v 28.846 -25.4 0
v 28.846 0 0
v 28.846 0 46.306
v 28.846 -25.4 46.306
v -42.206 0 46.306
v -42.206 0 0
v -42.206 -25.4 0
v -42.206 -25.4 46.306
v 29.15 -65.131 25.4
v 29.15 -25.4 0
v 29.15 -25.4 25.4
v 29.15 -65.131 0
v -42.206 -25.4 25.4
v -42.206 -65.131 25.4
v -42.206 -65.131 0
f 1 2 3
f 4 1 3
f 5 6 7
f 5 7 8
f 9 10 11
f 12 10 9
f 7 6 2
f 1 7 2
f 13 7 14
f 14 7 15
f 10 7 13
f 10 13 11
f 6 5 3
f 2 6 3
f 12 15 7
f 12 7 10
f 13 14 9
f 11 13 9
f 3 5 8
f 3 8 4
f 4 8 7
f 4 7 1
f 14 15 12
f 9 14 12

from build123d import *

# Parameters (mm, degrees)
F0_W     = 71.0525270551
F0_H     = 46.3055968285
F1_DEPTH = 25.4
F2_W     = 71.3561698794
F2_H     = 39.7314780116
F3_DEPTH = 25.4


# Not quite as in the source:
# - a feature of the source that left no trace in its solid (it failed there, or was rolled back) is left out


with BuildPart() as f1:
    # F0 (on Front) → F1 (new body)
    with BuildSketch(Plane.XZ):
        with Locations((-6.6801505163, 23.1527984142)):
            Rectangle(F0_W, F0_H)
    extrude(amount=F1_DEPTH)


with BuildPart() as f3:
    # F2 (on face) → F3 (new body)
    with BuildSketch(Plane(origin=(0, 0, 0), x_dir=(1, 0, 0), z_dir=(0, 0, -1))):
        with Locations((-6.5283291042, 45.2657390058)):
            Rectangle(F2_W, F2_H)
    extrude(amount=-F3_DEPTH)


solid = Compound([f1.part, f3.part])
